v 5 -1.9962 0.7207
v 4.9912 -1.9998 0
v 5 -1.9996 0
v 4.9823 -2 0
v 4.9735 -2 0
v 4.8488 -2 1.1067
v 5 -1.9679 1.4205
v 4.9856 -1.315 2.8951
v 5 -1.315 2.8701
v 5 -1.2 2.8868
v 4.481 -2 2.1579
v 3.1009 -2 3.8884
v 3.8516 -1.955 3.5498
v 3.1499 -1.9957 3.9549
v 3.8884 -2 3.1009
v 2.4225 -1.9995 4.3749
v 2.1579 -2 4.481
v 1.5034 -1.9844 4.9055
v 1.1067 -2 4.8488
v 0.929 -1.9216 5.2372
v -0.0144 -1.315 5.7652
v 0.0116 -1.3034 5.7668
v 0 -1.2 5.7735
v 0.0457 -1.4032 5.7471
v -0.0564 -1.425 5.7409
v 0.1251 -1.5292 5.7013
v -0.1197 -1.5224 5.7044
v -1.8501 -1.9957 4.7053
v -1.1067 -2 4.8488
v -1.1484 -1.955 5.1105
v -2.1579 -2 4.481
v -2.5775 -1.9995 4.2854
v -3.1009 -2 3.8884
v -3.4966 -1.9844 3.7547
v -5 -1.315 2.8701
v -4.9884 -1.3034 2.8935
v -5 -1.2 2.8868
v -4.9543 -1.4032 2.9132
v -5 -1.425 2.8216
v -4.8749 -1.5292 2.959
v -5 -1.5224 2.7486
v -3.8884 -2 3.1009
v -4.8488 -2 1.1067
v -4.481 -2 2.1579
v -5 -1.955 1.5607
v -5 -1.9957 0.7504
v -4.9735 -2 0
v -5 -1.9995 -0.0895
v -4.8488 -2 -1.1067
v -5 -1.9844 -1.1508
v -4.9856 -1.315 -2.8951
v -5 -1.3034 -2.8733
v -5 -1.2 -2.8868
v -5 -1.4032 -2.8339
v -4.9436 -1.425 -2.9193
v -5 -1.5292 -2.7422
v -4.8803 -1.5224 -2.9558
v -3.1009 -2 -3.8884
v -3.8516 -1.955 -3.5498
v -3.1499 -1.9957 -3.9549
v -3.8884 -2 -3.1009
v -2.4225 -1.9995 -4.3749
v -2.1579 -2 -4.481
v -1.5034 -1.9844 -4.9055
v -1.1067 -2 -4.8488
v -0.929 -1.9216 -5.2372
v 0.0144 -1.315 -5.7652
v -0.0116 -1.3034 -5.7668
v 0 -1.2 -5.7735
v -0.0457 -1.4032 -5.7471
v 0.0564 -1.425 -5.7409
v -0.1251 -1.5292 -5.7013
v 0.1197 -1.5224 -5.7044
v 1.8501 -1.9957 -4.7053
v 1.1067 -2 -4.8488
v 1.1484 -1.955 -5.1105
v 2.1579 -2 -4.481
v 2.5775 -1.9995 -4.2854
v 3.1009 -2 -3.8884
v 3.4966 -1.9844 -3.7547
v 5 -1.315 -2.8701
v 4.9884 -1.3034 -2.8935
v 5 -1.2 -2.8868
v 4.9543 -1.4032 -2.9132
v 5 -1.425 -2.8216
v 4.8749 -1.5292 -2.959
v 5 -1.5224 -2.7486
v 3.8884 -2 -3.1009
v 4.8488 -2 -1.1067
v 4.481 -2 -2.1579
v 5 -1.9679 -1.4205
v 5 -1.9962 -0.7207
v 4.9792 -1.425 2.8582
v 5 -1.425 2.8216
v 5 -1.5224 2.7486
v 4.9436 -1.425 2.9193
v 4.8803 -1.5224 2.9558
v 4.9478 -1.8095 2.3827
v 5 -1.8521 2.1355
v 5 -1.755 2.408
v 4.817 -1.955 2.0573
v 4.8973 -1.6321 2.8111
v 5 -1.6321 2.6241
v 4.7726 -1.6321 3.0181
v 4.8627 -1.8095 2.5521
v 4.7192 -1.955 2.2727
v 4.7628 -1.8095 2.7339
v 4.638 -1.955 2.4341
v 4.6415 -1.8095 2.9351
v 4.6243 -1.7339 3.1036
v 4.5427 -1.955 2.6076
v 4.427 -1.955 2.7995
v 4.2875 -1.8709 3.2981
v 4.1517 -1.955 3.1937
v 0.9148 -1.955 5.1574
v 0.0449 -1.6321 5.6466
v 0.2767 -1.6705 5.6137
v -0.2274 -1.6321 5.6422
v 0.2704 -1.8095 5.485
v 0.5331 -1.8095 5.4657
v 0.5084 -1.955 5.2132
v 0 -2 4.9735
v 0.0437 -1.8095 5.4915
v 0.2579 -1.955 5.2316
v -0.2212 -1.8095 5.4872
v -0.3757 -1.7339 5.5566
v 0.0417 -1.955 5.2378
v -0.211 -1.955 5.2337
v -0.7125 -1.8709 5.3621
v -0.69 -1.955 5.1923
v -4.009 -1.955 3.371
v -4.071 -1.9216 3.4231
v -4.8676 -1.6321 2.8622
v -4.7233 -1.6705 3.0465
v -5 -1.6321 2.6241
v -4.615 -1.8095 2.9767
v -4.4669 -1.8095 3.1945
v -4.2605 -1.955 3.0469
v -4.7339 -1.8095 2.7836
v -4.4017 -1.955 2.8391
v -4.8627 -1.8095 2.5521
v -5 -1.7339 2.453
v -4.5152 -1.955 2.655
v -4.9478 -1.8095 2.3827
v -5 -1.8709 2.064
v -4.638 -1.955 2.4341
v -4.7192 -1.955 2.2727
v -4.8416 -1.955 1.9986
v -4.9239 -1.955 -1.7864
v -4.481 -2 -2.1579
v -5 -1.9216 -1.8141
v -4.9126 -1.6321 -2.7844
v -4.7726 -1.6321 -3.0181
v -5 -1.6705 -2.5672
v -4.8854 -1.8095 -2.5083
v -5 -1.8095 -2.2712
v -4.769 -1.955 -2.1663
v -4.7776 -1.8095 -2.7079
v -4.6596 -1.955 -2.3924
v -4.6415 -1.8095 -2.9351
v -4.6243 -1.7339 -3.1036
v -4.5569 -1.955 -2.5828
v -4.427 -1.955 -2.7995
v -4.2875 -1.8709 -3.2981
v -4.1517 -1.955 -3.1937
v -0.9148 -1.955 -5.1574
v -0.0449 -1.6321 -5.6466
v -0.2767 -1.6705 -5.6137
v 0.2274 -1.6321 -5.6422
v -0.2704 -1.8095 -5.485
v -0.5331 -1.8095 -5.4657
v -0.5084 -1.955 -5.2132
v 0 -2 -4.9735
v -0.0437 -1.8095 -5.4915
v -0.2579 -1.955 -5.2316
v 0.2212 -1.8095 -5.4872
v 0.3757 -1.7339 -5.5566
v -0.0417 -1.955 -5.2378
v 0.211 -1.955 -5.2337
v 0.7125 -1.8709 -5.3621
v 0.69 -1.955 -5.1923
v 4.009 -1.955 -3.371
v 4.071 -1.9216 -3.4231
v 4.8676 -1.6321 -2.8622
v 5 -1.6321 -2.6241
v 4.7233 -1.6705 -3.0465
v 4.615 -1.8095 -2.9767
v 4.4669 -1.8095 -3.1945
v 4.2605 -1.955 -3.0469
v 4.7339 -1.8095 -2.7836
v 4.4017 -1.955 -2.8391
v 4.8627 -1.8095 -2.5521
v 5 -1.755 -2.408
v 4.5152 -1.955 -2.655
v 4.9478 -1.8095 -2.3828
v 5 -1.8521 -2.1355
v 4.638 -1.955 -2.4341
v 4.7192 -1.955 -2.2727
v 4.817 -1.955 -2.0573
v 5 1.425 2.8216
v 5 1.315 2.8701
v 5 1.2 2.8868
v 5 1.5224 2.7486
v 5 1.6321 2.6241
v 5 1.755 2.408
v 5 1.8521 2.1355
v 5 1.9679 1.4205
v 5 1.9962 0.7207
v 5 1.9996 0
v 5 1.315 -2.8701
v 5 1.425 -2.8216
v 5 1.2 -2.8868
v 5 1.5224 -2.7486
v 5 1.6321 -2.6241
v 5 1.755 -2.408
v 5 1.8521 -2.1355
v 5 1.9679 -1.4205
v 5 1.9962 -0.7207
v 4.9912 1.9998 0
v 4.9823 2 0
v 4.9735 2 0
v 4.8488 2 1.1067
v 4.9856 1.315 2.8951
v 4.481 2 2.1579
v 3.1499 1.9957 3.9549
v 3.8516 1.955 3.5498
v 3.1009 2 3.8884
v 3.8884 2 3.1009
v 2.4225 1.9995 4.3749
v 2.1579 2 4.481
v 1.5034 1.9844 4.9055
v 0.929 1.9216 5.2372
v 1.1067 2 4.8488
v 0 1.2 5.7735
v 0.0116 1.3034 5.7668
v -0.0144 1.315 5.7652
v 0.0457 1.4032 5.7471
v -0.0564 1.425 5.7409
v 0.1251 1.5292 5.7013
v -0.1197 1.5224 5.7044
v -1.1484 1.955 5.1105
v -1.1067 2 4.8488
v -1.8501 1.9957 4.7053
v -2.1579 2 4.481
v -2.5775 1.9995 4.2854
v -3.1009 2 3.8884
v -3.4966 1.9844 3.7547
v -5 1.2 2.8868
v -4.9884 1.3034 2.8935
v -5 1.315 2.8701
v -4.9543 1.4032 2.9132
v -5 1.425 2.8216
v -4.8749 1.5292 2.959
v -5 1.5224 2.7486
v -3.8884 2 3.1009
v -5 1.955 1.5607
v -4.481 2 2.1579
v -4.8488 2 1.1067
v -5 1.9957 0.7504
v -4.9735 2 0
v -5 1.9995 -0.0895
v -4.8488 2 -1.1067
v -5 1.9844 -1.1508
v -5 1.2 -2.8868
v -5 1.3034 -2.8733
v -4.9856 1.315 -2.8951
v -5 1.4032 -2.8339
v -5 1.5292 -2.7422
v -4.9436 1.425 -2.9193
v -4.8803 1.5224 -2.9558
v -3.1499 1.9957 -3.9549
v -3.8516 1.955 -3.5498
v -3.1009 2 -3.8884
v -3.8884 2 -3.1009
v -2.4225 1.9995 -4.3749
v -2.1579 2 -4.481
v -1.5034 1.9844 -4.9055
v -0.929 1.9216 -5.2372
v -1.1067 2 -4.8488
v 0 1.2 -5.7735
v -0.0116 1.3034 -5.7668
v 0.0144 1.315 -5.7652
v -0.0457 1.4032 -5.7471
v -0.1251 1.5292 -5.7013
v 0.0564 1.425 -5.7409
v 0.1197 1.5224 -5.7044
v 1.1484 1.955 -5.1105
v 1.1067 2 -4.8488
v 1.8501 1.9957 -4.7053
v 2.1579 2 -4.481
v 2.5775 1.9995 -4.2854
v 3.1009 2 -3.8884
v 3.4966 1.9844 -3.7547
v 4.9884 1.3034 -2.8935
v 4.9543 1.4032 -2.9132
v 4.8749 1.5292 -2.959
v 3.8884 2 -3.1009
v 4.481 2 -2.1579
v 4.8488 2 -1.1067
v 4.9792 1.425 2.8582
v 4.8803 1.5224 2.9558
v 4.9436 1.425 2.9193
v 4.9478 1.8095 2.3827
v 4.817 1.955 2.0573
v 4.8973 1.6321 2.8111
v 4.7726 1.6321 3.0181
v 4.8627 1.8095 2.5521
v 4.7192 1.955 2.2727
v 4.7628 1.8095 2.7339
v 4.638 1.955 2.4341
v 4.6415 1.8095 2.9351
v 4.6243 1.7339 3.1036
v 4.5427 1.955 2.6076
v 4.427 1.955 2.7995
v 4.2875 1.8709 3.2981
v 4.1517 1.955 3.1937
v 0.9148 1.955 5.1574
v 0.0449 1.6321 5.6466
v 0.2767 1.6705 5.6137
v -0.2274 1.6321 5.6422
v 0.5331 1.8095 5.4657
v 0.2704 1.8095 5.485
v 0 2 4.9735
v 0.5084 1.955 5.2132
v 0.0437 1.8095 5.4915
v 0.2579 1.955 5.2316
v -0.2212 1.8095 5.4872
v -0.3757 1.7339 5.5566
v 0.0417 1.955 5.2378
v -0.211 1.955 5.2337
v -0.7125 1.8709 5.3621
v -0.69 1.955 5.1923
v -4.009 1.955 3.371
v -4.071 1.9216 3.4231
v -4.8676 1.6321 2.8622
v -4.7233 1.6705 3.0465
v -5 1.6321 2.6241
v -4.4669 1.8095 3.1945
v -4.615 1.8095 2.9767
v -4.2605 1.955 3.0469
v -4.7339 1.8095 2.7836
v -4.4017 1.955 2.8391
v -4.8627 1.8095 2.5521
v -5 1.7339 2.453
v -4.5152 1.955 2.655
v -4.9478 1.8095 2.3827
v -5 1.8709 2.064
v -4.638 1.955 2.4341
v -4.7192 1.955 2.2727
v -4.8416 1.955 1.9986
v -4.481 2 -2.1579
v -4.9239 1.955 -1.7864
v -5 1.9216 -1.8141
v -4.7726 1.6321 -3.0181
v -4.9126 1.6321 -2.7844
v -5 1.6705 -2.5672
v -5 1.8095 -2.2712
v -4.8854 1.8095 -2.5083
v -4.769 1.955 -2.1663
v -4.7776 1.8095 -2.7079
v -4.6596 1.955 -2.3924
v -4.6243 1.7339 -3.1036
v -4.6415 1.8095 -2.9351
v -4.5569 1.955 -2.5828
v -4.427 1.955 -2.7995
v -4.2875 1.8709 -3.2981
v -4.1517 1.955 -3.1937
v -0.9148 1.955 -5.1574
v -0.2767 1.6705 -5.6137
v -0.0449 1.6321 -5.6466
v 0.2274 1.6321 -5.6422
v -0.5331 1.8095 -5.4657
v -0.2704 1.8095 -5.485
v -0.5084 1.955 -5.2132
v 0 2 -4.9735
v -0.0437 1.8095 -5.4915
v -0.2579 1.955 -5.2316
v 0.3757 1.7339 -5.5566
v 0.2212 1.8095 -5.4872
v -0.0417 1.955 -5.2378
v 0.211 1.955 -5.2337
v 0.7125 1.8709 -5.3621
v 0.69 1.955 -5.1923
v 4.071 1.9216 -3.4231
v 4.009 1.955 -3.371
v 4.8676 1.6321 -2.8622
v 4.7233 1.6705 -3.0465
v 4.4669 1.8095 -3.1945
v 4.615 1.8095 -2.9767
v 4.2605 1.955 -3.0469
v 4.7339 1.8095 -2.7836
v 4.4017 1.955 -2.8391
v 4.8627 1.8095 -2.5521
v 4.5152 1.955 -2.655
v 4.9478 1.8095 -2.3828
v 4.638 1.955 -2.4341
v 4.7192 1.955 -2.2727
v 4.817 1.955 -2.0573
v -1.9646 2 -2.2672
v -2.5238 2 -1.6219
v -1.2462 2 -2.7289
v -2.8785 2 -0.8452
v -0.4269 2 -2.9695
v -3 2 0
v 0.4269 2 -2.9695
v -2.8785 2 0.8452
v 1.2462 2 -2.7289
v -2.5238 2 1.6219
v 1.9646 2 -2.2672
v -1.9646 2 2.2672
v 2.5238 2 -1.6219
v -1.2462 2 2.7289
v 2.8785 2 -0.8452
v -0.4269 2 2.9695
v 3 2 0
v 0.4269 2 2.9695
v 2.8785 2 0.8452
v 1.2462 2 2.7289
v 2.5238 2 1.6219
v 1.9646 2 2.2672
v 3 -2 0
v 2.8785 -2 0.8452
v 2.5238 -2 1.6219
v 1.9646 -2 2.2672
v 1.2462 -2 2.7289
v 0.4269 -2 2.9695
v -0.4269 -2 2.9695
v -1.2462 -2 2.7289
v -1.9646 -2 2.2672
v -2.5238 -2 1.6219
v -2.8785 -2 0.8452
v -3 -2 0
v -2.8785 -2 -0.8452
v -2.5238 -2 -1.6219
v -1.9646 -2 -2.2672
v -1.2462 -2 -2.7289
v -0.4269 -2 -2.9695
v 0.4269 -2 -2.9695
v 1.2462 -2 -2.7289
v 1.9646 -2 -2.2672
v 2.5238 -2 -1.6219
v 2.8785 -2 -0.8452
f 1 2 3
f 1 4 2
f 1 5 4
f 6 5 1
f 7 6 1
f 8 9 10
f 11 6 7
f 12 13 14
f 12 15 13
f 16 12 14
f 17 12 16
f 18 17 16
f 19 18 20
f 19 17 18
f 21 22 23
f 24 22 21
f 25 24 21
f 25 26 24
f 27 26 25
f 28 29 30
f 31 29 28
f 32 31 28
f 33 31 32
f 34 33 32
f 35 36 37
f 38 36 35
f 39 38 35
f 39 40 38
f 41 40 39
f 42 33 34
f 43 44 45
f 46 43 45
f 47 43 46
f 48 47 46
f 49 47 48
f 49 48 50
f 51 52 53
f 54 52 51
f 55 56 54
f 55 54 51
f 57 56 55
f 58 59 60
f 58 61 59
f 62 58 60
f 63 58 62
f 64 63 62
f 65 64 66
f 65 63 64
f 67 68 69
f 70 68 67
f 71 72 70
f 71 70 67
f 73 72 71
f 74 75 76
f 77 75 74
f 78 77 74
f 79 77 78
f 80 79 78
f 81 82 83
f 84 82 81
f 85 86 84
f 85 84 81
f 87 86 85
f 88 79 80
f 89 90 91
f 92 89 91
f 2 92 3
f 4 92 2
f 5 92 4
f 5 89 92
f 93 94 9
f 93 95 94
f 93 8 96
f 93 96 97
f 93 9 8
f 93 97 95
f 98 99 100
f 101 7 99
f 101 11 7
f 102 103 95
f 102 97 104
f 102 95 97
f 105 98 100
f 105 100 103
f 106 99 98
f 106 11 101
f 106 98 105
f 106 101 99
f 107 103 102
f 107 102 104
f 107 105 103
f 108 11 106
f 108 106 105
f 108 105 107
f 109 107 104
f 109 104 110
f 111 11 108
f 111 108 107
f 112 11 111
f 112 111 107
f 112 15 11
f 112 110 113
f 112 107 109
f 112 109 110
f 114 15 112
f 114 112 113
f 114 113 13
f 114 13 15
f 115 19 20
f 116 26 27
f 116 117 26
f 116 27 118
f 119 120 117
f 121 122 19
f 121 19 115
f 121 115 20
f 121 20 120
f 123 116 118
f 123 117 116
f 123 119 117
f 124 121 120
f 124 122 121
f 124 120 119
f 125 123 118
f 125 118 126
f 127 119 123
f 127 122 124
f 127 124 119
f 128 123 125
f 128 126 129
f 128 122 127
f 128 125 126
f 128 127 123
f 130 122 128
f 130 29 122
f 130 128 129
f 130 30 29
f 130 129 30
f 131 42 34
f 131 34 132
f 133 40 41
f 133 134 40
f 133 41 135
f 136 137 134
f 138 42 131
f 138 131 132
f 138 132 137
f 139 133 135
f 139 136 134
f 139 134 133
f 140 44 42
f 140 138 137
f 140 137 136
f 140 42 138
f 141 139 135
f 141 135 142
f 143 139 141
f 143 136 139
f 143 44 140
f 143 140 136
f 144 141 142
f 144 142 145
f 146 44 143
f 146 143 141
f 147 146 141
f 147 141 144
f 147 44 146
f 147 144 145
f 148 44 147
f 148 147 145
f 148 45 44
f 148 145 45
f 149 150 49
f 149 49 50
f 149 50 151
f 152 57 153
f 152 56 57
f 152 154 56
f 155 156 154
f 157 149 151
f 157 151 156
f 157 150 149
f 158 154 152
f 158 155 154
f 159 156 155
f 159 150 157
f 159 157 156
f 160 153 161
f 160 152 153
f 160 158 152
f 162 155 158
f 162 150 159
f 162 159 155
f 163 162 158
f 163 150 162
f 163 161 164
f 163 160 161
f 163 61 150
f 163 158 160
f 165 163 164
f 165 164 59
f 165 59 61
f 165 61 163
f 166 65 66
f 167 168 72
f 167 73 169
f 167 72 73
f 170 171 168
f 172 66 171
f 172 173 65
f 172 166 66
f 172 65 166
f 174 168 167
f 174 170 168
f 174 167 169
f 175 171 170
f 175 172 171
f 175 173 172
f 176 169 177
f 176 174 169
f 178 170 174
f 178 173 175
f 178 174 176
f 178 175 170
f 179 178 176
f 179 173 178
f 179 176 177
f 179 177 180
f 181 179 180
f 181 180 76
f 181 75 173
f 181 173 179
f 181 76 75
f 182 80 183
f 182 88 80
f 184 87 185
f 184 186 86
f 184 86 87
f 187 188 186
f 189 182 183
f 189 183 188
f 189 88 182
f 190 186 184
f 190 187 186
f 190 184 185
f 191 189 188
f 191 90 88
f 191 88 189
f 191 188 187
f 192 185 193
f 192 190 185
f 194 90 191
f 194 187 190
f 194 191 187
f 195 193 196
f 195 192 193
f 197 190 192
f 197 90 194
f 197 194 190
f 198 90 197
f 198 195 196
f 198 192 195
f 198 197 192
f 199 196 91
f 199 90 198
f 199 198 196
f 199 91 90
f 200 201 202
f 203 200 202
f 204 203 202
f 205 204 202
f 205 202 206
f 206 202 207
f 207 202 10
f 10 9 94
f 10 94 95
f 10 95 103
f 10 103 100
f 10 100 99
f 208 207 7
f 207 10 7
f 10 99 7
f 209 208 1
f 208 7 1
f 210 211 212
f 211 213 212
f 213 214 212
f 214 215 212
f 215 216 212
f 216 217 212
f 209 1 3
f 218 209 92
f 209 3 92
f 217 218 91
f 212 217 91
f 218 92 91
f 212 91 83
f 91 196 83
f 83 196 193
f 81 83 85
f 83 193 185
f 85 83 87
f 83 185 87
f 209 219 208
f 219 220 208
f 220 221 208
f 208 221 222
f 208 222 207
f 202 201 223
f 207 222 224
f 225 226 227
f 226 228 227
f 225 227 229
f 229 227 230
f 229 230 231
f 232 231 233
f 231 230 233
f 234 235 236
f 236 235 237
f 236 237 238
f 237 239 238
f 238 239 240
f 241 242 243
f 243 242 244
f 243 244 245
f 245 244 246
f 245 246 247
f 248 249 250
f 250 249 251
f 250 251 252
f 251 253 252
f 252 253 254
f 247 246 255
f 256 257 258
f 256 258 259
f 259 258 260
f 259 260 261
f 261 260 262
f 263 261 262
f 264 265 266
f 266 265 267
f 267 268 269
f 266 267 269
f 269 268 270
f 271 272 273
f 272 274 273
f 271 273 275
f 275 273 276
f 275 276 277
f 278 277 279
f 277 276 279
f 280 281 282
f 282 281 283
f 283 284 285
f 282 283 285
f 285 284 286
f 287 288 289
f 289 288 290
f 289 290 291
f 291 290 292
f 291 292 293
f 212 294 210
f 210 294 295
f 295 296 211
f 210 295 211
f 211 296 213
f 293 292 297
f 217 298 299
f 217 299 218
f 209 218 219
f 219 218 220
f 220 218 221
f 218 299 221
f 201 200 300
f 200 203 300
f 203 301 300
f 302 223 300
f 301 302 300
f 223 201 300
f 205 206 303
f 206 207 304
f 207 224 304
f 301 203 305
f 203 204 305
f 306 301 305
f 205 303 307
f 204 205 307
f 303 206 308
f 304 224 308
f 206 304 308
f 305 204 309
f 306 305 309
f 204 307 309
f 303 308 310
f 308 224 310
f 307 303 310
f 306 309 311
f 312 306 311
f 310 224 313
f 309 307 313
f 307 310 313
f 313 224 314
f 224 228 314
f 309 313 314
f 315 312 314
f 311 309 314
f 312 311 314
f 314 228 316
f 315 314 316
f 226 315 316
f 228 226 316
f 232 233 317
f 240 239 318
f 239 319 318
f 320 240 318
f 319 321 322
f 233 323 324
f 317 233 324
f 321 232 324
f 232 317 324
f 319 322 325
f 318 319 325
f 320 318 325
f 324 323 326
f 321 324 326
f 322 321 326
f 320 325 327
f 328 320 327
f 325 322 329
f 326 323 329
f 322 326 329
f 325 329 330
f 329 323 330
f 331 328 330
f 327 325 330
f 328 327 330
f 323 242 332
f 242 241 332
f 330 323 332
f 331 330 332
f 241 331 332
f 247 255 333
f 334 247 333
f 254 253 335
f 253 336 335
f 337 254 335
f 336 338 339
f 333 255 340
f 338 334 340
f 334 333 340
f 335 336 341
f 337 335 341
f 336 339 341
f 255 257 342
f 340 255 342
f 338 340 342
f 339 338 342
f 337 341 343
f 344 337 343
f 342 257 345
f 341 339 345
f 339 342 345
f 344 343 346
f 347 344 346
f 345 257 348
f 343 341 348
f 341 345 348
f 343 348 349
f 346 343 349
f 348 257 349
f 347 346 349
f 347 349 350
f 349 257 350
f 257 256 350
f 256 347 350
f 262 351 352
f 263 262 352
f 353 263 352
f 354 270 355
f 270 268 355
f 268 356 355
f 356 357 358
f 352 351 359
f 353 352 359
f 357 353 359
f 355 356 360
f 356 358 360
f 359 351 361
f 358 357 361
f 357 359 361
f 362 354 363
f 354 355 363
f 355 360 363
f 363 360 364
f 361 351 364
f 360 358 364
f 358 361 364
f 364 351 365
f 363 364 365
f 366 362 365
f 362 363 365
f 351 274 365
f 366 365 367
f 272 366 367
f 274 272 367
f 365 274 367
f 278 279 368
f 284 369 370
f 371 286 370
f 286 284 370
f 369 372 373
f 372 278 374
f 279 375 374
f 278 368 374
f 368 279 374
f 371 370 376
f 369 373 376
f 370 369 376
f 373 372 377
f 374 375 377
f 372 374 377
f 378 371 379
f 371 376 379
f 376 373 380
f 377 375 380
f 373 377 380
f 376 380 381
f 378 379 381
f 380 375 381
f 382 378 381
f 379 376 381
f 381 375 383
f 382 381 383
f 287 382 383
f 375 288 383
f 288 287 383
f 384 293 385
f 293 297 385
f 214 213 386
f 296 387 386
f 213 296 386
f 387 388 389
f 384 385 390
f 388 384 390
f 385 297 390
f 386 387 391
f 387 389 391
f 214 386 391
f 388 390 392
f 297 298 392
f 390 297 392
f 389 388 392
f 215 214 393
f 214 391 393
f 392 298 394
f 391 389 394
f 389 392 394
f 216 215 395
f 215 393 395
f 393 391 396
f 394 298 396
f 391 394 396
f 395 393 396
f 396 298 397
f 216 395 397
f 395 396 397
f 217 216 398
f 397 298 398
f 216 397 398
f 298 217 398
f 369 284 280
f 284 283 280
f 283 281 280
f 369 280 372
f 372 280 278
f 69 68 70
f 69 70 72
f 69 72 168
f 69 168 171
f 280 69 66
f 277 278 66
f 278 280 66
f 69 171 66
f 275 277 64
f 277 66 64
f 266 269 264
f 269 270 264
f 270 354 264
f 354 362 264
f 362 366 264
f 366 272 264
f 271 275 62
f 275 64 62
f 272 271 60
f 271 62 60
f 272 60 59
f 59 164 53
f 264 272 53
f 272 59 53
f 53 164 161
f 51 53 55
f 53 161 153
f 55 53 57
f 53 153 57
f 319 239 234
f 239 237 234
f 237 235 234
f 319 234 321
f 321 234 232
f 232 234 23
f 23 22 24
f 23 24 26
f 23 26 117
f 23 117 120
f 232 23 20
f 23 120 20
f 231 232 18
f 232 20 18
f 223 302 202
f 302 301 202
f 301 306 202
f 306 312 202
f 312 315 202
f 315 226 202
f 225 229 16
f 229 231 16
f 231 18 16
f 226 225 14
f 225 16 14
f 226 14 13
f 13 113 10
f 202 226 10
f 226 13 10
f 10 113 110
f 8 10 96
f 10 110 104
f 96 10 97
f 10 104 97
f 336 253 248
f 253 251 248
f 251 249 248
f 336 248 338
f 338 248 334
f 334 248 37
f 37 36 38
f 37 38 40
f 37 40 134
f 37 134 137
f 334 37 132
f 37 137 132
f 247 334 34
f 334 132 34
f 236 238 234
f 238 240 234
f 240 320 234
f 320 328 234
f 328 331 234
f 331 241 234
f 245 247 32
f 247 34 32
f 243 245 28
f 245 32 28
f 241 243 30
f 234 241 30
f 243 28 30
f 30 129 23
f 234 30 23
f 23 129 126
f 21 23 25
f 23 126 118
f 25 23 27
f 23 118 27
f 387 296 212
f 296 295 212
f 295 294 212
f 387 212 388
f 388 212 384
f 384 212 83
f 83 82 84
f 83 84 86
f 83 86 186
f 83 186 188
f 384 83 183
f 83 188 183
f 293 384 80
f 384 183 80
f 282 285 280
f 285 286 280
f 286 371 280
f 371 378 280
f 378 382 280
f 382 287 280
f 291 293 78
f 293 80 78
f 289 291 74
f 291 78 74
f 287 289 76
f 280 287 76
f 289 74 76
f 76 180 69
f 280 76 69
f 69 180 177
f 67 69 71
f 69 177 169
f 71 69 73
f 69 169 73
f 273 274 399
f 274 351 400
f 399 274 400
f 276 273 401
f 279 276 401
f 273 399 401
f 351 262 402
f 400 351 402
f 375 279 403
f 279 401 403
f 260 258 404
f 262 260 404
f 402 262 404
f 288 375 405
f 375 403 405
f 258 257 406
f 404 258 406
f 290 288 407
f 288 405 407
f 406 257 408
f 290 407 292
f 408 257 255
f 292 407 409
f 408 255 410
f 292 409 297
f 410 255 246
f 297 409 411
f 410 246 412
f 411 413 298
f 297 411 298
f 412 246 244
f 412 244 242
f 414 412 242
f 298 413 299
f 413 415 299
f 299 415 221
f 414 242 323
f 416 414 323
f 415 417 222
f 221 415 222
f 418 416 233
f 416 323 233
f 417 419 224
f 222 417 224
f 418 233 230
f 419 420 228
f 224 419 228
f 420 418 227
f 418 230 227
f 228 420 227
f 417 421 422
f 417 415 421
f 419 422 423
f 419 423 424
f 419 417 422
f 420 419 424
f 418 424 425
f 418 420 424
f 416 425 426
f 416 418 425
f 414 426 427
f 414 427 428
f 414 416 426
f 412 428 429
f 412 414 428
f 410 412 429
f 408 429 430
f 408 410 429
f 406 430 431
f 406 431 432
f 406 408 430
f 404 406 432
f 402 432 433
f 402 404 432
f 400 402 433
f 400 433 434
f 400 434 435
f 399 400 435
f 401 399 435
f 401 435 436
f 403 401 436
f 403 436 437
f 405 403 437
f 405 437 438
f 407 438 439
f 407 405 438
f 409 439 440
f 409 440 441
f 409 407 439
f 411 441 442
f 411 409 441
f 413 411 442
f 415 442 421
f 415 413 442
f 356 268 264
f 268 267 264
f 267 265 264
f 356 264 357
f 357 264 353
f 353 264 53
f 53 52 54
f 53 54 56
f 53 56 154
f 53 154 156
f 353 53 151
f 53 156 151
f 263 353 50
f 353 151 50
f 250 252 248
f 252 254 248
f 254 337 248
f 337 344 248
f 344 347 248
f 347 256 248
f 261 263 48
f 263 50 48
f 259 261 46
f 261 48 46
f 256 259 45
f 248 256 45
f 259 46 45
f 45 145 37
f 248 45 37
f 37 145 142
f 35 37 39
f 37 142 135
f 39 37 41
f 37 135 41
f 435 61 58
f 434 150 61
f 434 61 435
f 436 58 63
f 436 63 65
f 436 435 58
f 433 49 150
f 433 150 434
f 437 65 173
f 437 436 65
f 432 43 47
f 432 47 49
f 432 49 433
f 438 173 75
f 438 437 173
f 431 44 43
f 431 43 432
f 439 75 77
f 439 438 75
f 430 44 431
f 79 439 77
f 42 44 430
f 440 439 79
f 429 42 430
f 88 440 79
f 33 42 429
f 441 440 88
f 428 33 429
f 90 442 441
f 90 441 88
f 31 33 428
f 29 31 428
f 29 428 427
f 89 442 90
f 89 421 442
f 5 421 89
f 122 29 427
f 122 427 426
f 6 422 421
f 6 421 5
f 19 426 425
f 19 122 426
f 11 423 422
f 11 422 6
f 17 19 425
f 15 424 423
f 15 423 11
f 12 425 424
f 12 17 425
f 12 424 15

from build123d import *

# Parameters (mm, degrees)
F0_R     = 5.7735026919
F0_R_2   = 3
F1_DEPTH = 2
F3_R     = 0.8
F2_R     = 6
F4_DEPTH = 4.001


with BuildPart() as f1:
    # F0 (on Front) → F1 (new body, symmetric)
    with BuildSketch(Plane.XZ):
        Circle(F0_R)
        Circle(F0_R_2, mode=Mode.SUBTRACT)
    extrude(amount=F1_DEPTH, both=True)

    # F3
    f3_edges = [f1.edges().sort_by_distance(p)[0] for p in [
        (-5.773503, -2, 0),
        (-5.773503, 2, 0),
    ]]
    fillet(f3_edges, radius=F3_R)

    # F2 (on face) → F4 (cut, through all)
    with BuildSketch(Plane.XZ.offset(2)):
        Circle(F2_R)
        Polygon((0, -5.7735026919), (-5, -2.8867513459), (-5, 2.8867513459), (0, 5.7735026919), (5, 2.8867513459), (5, -2.8867513459), align=None, mode=Mode.SUBTRACT)
    extrude(amount=-F4_DEPTH, mode=Mode.SUBTRACT)


solid = f1.part
